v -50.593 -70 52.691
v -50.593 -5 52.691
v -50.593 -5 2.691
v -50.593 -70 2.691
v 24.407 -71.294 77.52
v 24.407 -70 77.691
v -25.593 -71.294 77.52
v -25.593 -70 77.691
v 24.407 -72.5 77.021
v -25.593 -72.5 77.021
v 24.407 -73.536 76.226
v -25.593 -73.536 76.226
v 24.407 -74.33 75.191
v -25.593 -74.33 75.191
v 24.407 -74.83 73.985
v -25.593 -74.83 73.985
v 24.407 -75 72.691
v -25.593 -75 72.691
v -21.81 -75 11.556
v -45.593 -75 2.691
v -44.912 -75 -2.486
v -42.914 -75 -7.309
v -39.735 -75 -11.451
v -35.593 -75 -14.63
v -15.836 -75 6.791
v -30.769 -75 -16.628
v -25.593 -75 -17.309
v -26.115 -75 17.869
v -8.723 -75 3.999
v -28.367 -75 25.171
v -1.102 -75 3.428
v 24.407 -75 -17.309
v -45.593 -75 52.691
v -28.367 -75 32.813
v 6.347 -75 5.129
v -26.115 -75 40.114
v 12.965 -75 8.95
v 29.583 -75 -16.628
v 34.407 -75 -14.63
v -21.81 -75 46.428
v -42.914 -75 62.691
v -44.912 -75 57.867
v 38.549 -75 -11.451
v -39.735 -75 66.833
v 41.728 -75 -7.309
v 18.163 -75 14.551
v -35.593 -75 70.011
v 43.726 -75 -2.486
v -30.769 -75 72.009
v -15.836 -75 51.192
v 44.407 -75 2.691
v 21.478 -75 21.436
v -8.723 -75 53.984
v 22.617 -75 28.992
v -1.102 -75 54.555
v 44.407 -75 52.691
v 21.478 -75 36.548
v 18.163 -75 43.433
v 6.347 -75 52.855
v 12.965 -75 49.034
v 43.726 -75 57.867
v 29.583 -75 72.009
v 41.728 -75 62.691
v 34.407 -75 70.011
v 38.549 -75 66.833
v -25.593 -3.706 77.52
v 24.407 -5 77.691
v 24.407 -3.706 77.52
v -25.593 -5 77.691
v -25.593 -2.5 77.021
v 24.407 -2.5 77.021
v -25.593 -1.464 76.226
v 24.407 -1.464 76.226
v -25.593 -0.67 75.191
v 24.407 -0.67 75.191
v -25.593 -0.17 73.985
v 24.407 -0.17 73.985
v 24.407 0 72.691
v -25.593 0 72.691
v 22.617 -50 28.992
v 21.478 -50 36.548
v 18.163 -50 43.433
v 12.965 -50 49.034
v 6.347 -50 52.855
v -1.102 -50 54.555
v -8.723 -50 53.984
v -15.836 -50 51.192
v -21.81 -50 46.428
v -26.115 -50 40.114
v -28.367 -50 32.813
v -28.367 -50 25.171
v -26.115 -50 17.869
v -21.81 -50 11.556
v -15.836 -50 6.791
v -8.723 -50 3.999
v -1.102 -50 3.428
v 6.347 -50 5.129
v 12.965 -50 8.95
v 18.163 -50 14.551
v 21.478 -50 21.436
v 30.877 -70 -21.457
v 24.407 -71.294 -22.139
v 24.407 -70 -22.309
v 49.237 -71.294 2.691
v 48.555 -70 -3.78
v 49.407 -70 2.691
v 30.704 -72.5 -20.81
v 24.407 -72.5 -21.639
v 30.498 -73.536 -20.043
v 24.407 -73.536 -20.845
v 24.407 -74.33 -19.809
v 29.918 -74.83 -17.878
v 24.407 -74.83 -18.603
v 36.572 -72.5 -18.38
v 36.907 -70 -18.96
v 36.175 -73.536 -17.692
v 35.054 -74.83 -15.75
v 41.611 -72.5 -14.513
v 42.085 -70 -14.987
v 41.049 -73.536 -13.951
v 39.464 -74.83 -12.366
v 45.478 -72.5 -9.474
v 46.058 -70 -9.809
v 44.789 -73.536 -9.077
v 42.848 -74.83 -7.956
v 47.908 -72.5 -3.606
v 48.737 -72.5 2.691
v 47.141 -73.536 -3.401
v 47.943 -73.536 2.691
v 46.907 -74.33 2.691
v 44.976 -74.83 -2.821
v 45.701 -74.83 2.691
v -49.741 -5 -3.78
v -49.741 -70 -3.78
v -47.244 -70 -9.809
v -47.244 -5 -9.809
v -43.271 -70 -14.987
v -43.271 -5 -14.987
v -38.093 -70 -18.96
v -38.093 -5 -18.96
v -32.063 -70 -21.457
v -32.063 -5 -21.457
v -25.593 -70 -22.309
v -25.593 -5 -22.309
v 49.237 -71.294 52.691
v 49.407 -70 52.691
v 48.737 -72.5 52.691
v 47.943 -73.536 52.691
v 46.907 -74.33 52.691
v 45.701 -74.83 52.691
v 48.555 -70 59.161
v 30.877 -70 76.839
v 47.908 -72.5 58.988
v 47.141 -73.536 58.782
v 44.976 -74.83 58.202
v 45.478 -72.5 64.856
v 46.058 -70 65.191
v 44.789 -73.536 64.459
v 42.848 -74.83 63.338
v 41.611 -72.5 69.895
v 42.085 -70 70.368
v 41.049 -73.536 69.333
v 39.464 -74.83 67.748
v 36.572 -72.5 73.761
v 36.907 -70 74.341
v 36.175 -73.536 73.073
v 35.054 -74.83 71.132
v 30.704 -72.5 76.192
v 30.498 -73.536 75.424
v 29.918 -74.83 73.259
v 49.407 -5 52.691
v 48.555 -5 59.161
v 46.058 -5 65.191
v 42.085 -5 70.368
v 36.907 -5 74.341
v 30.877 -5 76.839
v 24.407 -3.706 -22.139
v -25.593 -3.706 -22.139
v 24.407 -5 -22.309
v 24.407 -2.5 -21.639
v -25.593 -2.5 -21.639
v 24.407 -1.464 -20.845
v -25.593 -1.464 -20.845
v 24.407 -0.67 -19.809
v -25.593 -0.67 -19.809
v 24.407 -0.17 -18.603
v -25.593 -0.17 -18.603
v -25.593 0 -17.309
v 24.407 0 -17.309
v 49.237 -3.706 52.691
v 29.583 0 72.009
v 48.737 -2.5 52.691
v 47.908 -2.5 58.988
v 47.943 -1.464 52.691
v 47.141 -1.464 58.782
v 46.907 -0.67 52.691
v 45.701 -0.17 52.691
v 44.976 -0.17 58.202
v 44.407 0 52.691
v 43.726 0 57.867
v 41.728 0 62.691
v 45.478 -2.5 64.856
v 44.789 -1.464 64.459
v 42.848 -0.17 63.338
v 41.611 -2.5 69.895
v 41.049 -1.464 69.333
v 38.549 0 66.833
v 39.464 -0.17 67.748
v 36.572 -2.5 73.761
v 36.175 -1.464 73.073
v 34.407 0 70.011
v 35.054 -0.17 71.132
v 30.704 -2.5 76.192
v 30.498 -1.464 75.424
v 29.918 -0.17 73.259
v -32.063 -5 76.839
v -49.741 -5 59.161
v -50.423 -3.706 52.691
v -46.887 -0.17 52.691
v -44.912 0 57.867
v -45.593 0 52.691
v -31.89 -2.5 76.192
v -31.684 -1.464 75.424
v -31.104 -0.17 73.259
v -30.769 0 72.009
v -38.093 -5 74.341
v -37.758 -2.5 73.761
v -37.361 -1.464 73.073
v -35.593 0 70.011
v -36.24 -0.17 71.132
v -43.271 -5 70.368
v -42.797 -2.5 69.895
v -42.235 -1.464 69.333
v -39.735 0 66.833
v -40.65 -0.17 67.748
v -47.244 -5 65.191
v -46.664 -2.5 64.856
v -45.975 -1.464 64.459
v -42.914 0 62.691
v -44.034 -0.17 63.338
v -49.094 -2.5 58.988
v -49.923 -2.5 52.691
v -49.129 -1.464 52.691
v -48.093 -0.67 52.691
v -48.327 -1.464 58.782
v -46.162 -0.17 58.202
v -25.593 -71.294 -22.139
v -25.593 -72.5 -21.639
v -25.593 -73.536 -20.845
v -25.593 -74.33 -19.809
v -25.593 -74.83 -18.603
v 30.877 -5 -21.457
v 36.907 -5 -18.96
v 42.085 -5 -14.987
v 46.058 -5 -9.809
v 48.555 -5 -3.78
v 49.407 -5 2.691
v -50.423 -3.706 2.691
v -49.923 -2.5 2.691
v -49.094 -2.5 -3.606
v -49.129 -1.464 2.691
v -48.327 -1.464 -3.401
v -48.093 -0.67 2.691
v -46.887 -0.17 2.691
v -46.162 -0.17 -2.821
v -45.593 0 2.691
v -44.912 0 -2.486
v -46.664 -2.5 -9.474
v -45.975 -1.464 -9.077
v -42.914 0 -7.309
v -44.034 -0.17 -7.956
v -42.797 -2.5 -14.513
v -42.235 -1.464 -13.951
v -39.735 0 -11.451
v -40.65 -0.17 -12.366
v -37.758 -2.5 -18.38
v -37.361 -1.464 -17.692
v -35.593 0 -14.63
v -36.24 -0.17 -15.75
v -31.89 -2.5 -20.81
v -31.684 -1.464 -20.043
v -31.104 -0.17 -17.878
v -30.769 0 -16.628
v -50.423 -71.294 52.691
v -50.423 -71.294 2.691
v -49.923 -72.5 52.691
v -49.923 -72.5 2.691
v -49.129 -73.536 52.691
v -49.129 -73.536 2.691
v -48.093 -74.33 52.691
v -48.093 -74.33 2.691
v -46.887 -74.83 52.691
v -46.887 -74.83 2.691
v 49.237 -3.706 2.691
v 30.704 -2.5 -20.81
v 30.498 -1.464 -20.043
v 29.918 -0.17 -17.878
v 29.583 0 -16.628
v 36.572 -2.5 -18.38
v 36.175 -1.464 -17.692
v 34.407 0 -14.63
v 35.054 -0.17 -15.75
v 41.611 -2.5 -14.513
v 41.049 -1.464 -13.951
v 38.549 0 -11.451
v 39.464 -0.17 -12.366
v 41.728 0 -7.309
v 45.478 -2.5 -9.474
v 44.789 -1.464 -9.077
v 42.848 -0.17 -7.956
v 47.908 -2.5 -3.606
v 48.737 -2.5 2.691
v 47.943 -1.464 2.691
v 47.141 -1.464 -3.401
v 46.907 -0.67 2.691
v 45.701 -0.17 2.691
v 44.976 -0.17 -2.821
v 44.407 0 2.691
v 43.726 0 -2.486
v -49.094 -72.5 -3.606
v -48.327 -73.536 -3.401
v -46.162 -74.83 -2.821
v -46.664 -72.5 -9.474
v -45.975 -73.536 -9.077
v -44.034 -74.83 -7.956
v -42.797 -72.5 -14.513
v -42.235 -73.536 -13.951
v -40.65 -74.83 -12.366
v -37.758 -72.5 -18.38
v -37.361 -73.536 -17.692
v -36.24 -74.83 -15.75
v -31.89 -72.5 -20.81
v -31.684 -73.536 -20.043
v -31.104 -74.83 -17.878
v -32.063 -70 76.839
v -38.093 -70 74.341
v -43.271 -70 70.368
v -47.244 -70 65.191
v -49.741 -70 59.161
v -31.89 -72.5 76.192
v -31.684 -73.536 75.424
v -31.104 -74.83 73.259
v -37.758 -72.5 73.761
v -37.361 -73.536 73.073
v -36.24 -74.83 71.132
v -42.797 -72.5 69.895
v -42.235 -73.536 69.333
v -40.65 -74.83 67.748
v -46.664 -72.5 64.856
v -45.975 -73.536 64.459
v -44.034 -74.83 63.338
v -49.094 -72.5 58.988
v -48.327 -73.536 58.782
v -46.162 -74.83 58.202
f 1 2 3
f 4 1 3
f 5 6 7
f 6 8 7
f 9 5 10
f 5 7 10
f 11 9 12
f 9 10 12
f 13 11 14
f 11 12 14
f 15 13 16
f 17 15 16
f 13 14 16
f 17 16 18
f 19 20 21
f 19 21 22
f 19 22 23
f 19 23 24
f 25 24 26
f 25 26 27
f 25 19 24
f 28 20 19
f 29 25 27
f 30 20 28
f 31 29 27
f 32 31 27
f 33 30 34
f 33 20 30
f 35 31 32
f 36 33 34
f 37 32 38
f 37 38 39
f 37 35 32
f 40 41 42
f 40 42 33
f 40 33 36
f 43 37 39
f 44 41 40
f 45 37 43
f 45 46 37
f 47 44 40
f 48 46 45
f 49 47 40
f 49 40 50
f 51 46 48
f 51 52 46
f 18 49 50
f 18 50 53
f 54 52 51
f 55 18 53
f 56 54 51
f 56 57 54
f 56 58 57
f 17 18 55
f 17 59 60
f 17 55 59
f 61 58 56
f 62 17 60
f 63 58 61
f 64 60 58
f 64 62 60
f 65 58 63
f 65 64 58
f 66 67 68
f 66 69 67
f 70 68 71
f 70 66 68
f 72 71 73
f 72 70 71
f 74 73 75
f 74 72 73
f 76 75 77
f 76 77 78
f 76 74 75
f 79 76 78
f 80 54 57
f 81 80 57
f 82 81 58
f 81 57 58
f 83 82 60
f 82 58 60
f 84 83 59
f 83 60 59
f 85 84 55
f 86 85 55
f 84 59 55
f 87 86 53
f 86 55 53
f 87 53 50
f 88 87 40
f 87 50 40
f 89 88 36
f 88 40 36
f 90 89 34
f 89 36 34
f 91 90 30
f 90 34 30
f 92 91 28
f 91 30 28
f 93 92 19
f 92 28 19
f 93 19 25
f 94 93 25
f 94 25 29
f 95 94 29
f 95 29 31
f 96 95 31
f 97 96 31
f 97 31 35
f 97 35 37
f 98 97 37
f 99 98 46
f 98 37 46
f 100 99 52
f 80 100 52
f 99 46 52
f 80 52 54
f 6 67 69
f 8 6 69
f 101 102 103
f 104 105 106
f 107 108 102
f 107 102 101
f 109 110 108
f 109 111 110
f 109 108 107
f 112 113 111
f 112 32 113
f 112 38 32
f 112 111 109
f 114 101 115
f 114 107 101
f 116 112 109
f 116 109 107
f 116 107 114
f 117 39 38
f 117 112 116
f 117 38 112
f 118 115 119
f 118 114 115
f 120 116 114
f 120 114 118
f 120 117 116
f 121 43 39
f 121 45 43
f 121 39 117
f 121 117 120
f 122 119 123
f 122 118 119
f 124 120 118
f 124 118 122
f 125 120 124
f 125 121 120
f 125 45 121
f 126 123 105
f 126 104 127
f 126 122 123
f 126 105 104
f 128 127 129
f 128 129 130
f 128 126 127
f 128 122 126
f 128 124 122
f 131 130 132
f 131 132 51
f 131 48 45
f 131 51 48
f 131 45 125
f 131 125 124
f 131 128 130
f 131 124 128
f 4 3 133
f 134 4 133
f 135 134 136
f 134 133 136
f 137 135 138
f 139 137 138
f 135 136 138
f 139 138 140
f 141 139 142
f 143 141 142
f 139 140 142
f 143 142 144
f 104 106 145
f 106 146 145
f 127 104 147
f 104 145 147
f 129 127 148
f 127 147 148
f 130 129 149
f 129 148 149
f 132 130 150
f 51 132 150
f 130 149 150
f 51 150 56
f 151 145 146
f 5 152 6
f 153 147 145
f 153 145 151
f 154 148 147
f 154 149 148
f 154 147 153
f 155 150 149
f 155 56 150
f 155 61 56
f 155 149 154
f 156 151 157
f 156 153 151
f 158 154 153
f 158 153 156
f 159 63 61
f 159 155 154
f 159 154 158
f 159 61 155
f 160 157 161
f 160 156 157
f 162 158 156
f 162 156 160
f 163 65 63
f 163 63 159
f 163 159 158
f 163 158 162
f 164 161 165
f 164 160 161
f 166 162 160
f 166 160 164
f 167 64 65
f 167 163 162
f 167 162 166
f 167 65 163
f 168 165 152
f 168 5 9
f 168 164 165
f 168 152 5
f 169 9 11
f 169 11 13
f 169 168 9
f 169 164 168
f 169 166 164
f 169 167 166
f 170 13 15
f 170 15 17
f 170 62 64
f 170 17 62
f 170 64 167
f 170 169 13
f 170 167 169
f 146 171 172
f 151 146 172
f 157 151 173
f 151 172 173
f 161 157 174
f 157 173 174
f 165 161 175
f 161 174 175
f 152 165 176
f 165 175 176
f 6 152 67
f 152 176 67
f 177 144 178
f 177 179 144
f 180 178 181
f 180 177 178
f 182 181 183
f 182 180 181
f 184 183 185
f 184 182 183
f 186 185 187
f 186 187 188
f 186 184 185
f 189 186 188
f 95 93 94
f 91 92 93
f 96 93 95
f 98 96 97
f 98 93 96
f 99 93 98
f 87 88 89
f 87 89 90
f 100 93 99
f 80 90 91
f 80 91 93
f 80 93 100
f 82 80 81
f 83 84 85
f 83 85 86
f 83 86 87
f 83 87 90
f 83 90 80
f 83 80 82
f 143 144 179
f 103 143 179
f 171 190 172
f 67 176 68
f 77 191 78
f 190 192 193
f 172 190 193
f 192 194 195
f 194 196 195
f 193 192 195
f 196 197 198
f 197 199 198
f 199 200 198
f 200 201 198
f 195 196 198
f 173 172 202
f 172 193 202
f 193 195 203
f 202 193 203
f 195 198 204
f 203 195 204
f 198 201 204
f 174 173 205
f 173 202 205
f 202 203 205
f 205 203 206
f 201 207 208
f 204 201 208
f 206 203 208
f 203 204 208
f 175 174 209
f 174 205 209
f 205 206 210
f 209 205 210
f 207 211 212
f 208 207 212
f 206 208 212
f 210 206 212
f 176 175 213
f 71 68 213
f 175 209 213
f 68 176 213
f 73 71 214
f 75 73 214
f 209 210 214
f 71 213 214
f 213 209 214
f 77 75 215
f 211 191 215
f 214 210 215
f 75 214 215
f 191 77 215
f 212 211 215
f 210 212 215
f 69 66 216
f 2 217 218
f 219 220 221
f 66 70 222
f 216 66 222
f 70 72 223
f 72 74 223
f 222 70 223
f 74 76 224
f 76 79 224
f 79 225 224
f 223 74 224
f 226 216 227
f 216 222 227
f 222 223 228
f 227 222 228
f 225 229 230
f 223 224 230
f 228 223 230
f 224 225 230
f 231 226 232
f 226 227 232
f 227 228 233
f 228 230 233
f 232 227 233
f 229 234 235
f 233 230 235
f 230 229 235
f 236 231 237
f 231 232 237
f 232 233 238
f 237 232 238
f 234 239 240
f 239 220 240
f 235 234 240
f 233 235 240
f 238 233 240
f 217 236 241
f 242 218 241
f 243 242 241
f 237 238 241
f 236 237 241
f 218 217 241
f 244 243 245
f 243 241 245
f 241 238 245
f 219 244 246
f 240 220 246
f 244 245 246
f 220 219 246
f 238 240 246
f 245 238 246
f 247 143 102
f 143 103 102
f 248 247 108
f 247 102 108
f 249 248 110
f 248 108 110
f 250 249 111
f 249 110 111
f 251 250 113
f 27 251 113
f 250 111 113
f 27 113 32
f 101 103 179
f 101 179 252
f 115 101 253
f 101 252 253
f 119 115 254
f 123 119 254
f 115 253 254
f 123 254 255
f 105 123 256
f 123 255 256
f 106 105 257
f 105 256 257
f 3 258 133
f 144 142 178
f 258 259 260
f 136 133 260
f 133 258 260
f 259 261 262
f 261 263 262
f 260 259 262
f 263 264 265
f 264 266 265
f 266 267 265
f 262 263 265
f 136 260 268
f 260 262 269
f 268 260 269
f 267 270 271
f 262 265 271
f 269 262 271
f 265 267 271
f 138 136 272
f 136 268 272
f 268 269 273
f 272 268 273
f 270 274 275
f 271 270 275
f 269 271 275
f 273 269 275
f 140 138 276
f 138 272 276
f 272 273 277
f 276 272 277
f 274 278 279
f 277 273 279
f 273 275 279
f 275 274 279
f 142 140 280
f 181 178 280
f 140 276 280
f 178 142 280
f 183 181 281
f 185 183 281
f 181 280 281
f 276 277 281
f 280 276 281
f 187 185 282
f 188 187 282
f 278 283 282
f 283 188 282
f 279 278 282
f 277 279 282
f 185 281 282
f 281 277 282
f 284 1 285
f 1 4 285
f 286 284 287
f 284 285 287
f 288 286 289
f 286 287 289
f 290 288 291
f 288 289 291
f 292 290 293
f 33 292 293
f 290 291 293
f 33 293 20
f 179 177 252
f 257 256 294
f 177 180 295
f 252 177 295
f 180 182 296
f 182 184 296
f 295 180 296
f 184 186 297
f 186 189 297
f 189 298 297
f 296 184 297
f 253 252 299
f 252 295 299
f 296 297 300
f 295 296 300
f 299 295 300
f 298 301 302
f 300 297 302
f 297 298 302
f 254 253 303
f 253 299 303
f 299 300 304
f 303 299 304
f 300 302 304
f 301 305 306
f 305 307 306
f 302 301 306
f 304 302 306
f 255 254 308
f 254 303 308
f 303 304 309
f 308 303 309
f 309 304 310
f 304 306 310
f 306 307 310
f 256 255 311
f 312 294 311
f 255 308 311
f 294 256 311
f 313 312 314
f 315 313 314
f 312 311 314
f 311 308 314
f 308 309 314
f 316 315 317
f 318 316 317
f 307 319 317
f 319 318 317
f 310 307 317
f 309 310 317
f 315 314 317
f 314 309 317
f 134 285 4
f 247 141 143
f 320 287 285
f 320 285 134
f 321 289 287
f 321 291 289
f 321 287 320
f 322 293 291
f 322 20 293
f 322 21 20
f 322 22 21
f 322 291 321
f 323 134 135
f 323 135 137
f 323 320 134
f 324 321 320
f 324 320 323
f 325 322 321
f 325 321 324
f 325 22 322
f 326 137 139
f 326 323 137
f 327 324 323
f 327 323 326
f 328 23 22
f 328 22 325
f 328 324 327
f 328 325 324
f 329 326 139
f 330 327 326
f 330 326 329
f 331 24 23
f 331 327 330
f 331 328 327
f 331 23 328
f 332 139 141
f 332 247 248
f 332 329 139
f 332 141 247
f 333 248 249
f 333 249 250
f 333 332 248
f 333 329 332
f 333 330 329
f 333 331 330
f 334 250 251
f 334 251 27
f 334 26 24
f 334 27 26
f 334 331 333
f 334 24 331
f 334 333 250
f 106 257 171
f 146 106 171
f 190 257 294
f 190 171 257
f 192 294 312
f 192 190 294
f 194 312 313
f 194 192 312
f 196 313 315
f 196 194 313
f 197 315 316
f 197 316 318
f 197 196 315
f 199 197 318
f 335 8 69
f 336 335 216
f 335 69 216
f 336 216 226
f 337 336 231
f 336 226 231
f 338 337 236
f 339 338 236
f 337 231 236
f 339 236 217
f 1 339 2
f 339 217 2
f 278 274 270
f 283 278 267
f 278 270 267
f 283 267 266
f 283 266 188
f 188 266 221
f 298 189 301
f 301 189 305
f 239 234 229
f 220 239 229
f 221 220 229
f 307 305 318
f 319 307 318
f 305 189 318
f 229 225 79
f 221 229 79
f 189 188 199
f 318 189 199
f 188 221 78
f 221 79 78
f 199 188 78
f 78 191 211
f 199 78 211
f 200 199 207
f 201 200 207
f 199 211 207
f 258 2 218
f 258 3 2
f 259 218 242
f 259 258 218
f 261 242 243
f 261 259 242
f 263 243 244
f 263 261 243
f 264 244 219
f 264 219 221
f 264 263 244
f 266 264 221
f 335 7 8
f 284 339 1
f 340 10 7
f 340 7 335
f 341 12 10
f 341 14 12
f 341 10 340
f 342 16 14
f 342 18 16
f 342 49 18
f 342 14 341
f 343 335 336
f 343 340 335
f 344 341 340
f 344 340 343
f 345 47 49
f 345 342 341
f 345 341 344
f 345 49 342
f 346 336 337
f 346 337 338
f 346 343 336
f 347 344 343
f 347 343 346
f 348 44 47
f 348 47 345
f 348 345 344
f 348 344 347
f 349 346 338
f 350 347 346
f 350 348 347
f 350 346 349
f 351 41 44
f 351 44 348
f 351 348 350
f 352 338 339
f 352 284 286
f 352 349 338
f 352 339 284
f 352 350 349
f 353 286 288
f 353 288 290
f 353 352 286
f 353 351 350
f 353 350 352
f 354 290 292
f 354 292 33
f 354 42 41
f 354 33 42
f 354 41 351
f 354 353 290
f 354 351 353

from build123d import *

# Parameters (mm, degrees)
F1_DEPTH = 75
F2_R     = 5
F3_R     = 25.635066
F4_DEPTH = 25


with BuildPart() as f1:
    # F0 (on Front) → F1 (new body)
    with BuildSketch(Plane.XZ):
        with BuildLine():
            Line((24.407001, 77.690751), (-25.592999, 77.690751))
            ThreePointArc((-25.592999, 77.690751), (-43.270669, 70.36842), (-50.592999, 52.690751))
            Line((-50.592999, 52.690751), (-50.592999, 2.690751))
            ThreePointArc((-50.592999, 2.690751), (-43.270669, -14.986919), (-25.592999, -22.309249))
            Line((-25.592999, -22.309249), (24.407001, -22.309249))
            ThreePointArc((24.407001, -22.309249), (42.08467, -14.986919), (49.407001, 2.690751))
            Line((49.407001, 2.690751), (49.407001, 52.690751))
            ThreePointArc((49.407001, 52.690751), (42.08467, 70.36842), (24.407001, 77.690751))
        make_face()
    extrude(amount=F1_DEPTH)

    # F2
    f2_edges = [f1.edges().sort_by_distance(p)[0] for p in [
        (24.407001, -37.5, 77.690751),
        (-0.592999, -75, 77.690751),
        (42.08467, -75, 70.36842),
        (-50.592999, -37.5, 2.690751),
        (-50.592999, 0, 27.690751),
        (-43.270669, 0, -14.986919),
        (42.08467, 0, 70.36842),
        (49.407001, 0, 27.690751),
        (-0.592999, 0, 77.690751),
        (-43.270669, 0, 70.36842),
        (-0.592999, 0, -22.309249),
        (42.08467, 0, -14.986919),
    ]]
    fillet(f2_edges, radius=F2_R)

    # F3 (on face) → F4 (cut)
    with BuildSketch(Plane.XZ.offset(75)):
        with Locations((-3.018171, 28.991828)):
            Circle(F3_R)
    extrude(amount=-F4_DEPTH, mode=Mode.SUBTRACT)


solid = f1.part
